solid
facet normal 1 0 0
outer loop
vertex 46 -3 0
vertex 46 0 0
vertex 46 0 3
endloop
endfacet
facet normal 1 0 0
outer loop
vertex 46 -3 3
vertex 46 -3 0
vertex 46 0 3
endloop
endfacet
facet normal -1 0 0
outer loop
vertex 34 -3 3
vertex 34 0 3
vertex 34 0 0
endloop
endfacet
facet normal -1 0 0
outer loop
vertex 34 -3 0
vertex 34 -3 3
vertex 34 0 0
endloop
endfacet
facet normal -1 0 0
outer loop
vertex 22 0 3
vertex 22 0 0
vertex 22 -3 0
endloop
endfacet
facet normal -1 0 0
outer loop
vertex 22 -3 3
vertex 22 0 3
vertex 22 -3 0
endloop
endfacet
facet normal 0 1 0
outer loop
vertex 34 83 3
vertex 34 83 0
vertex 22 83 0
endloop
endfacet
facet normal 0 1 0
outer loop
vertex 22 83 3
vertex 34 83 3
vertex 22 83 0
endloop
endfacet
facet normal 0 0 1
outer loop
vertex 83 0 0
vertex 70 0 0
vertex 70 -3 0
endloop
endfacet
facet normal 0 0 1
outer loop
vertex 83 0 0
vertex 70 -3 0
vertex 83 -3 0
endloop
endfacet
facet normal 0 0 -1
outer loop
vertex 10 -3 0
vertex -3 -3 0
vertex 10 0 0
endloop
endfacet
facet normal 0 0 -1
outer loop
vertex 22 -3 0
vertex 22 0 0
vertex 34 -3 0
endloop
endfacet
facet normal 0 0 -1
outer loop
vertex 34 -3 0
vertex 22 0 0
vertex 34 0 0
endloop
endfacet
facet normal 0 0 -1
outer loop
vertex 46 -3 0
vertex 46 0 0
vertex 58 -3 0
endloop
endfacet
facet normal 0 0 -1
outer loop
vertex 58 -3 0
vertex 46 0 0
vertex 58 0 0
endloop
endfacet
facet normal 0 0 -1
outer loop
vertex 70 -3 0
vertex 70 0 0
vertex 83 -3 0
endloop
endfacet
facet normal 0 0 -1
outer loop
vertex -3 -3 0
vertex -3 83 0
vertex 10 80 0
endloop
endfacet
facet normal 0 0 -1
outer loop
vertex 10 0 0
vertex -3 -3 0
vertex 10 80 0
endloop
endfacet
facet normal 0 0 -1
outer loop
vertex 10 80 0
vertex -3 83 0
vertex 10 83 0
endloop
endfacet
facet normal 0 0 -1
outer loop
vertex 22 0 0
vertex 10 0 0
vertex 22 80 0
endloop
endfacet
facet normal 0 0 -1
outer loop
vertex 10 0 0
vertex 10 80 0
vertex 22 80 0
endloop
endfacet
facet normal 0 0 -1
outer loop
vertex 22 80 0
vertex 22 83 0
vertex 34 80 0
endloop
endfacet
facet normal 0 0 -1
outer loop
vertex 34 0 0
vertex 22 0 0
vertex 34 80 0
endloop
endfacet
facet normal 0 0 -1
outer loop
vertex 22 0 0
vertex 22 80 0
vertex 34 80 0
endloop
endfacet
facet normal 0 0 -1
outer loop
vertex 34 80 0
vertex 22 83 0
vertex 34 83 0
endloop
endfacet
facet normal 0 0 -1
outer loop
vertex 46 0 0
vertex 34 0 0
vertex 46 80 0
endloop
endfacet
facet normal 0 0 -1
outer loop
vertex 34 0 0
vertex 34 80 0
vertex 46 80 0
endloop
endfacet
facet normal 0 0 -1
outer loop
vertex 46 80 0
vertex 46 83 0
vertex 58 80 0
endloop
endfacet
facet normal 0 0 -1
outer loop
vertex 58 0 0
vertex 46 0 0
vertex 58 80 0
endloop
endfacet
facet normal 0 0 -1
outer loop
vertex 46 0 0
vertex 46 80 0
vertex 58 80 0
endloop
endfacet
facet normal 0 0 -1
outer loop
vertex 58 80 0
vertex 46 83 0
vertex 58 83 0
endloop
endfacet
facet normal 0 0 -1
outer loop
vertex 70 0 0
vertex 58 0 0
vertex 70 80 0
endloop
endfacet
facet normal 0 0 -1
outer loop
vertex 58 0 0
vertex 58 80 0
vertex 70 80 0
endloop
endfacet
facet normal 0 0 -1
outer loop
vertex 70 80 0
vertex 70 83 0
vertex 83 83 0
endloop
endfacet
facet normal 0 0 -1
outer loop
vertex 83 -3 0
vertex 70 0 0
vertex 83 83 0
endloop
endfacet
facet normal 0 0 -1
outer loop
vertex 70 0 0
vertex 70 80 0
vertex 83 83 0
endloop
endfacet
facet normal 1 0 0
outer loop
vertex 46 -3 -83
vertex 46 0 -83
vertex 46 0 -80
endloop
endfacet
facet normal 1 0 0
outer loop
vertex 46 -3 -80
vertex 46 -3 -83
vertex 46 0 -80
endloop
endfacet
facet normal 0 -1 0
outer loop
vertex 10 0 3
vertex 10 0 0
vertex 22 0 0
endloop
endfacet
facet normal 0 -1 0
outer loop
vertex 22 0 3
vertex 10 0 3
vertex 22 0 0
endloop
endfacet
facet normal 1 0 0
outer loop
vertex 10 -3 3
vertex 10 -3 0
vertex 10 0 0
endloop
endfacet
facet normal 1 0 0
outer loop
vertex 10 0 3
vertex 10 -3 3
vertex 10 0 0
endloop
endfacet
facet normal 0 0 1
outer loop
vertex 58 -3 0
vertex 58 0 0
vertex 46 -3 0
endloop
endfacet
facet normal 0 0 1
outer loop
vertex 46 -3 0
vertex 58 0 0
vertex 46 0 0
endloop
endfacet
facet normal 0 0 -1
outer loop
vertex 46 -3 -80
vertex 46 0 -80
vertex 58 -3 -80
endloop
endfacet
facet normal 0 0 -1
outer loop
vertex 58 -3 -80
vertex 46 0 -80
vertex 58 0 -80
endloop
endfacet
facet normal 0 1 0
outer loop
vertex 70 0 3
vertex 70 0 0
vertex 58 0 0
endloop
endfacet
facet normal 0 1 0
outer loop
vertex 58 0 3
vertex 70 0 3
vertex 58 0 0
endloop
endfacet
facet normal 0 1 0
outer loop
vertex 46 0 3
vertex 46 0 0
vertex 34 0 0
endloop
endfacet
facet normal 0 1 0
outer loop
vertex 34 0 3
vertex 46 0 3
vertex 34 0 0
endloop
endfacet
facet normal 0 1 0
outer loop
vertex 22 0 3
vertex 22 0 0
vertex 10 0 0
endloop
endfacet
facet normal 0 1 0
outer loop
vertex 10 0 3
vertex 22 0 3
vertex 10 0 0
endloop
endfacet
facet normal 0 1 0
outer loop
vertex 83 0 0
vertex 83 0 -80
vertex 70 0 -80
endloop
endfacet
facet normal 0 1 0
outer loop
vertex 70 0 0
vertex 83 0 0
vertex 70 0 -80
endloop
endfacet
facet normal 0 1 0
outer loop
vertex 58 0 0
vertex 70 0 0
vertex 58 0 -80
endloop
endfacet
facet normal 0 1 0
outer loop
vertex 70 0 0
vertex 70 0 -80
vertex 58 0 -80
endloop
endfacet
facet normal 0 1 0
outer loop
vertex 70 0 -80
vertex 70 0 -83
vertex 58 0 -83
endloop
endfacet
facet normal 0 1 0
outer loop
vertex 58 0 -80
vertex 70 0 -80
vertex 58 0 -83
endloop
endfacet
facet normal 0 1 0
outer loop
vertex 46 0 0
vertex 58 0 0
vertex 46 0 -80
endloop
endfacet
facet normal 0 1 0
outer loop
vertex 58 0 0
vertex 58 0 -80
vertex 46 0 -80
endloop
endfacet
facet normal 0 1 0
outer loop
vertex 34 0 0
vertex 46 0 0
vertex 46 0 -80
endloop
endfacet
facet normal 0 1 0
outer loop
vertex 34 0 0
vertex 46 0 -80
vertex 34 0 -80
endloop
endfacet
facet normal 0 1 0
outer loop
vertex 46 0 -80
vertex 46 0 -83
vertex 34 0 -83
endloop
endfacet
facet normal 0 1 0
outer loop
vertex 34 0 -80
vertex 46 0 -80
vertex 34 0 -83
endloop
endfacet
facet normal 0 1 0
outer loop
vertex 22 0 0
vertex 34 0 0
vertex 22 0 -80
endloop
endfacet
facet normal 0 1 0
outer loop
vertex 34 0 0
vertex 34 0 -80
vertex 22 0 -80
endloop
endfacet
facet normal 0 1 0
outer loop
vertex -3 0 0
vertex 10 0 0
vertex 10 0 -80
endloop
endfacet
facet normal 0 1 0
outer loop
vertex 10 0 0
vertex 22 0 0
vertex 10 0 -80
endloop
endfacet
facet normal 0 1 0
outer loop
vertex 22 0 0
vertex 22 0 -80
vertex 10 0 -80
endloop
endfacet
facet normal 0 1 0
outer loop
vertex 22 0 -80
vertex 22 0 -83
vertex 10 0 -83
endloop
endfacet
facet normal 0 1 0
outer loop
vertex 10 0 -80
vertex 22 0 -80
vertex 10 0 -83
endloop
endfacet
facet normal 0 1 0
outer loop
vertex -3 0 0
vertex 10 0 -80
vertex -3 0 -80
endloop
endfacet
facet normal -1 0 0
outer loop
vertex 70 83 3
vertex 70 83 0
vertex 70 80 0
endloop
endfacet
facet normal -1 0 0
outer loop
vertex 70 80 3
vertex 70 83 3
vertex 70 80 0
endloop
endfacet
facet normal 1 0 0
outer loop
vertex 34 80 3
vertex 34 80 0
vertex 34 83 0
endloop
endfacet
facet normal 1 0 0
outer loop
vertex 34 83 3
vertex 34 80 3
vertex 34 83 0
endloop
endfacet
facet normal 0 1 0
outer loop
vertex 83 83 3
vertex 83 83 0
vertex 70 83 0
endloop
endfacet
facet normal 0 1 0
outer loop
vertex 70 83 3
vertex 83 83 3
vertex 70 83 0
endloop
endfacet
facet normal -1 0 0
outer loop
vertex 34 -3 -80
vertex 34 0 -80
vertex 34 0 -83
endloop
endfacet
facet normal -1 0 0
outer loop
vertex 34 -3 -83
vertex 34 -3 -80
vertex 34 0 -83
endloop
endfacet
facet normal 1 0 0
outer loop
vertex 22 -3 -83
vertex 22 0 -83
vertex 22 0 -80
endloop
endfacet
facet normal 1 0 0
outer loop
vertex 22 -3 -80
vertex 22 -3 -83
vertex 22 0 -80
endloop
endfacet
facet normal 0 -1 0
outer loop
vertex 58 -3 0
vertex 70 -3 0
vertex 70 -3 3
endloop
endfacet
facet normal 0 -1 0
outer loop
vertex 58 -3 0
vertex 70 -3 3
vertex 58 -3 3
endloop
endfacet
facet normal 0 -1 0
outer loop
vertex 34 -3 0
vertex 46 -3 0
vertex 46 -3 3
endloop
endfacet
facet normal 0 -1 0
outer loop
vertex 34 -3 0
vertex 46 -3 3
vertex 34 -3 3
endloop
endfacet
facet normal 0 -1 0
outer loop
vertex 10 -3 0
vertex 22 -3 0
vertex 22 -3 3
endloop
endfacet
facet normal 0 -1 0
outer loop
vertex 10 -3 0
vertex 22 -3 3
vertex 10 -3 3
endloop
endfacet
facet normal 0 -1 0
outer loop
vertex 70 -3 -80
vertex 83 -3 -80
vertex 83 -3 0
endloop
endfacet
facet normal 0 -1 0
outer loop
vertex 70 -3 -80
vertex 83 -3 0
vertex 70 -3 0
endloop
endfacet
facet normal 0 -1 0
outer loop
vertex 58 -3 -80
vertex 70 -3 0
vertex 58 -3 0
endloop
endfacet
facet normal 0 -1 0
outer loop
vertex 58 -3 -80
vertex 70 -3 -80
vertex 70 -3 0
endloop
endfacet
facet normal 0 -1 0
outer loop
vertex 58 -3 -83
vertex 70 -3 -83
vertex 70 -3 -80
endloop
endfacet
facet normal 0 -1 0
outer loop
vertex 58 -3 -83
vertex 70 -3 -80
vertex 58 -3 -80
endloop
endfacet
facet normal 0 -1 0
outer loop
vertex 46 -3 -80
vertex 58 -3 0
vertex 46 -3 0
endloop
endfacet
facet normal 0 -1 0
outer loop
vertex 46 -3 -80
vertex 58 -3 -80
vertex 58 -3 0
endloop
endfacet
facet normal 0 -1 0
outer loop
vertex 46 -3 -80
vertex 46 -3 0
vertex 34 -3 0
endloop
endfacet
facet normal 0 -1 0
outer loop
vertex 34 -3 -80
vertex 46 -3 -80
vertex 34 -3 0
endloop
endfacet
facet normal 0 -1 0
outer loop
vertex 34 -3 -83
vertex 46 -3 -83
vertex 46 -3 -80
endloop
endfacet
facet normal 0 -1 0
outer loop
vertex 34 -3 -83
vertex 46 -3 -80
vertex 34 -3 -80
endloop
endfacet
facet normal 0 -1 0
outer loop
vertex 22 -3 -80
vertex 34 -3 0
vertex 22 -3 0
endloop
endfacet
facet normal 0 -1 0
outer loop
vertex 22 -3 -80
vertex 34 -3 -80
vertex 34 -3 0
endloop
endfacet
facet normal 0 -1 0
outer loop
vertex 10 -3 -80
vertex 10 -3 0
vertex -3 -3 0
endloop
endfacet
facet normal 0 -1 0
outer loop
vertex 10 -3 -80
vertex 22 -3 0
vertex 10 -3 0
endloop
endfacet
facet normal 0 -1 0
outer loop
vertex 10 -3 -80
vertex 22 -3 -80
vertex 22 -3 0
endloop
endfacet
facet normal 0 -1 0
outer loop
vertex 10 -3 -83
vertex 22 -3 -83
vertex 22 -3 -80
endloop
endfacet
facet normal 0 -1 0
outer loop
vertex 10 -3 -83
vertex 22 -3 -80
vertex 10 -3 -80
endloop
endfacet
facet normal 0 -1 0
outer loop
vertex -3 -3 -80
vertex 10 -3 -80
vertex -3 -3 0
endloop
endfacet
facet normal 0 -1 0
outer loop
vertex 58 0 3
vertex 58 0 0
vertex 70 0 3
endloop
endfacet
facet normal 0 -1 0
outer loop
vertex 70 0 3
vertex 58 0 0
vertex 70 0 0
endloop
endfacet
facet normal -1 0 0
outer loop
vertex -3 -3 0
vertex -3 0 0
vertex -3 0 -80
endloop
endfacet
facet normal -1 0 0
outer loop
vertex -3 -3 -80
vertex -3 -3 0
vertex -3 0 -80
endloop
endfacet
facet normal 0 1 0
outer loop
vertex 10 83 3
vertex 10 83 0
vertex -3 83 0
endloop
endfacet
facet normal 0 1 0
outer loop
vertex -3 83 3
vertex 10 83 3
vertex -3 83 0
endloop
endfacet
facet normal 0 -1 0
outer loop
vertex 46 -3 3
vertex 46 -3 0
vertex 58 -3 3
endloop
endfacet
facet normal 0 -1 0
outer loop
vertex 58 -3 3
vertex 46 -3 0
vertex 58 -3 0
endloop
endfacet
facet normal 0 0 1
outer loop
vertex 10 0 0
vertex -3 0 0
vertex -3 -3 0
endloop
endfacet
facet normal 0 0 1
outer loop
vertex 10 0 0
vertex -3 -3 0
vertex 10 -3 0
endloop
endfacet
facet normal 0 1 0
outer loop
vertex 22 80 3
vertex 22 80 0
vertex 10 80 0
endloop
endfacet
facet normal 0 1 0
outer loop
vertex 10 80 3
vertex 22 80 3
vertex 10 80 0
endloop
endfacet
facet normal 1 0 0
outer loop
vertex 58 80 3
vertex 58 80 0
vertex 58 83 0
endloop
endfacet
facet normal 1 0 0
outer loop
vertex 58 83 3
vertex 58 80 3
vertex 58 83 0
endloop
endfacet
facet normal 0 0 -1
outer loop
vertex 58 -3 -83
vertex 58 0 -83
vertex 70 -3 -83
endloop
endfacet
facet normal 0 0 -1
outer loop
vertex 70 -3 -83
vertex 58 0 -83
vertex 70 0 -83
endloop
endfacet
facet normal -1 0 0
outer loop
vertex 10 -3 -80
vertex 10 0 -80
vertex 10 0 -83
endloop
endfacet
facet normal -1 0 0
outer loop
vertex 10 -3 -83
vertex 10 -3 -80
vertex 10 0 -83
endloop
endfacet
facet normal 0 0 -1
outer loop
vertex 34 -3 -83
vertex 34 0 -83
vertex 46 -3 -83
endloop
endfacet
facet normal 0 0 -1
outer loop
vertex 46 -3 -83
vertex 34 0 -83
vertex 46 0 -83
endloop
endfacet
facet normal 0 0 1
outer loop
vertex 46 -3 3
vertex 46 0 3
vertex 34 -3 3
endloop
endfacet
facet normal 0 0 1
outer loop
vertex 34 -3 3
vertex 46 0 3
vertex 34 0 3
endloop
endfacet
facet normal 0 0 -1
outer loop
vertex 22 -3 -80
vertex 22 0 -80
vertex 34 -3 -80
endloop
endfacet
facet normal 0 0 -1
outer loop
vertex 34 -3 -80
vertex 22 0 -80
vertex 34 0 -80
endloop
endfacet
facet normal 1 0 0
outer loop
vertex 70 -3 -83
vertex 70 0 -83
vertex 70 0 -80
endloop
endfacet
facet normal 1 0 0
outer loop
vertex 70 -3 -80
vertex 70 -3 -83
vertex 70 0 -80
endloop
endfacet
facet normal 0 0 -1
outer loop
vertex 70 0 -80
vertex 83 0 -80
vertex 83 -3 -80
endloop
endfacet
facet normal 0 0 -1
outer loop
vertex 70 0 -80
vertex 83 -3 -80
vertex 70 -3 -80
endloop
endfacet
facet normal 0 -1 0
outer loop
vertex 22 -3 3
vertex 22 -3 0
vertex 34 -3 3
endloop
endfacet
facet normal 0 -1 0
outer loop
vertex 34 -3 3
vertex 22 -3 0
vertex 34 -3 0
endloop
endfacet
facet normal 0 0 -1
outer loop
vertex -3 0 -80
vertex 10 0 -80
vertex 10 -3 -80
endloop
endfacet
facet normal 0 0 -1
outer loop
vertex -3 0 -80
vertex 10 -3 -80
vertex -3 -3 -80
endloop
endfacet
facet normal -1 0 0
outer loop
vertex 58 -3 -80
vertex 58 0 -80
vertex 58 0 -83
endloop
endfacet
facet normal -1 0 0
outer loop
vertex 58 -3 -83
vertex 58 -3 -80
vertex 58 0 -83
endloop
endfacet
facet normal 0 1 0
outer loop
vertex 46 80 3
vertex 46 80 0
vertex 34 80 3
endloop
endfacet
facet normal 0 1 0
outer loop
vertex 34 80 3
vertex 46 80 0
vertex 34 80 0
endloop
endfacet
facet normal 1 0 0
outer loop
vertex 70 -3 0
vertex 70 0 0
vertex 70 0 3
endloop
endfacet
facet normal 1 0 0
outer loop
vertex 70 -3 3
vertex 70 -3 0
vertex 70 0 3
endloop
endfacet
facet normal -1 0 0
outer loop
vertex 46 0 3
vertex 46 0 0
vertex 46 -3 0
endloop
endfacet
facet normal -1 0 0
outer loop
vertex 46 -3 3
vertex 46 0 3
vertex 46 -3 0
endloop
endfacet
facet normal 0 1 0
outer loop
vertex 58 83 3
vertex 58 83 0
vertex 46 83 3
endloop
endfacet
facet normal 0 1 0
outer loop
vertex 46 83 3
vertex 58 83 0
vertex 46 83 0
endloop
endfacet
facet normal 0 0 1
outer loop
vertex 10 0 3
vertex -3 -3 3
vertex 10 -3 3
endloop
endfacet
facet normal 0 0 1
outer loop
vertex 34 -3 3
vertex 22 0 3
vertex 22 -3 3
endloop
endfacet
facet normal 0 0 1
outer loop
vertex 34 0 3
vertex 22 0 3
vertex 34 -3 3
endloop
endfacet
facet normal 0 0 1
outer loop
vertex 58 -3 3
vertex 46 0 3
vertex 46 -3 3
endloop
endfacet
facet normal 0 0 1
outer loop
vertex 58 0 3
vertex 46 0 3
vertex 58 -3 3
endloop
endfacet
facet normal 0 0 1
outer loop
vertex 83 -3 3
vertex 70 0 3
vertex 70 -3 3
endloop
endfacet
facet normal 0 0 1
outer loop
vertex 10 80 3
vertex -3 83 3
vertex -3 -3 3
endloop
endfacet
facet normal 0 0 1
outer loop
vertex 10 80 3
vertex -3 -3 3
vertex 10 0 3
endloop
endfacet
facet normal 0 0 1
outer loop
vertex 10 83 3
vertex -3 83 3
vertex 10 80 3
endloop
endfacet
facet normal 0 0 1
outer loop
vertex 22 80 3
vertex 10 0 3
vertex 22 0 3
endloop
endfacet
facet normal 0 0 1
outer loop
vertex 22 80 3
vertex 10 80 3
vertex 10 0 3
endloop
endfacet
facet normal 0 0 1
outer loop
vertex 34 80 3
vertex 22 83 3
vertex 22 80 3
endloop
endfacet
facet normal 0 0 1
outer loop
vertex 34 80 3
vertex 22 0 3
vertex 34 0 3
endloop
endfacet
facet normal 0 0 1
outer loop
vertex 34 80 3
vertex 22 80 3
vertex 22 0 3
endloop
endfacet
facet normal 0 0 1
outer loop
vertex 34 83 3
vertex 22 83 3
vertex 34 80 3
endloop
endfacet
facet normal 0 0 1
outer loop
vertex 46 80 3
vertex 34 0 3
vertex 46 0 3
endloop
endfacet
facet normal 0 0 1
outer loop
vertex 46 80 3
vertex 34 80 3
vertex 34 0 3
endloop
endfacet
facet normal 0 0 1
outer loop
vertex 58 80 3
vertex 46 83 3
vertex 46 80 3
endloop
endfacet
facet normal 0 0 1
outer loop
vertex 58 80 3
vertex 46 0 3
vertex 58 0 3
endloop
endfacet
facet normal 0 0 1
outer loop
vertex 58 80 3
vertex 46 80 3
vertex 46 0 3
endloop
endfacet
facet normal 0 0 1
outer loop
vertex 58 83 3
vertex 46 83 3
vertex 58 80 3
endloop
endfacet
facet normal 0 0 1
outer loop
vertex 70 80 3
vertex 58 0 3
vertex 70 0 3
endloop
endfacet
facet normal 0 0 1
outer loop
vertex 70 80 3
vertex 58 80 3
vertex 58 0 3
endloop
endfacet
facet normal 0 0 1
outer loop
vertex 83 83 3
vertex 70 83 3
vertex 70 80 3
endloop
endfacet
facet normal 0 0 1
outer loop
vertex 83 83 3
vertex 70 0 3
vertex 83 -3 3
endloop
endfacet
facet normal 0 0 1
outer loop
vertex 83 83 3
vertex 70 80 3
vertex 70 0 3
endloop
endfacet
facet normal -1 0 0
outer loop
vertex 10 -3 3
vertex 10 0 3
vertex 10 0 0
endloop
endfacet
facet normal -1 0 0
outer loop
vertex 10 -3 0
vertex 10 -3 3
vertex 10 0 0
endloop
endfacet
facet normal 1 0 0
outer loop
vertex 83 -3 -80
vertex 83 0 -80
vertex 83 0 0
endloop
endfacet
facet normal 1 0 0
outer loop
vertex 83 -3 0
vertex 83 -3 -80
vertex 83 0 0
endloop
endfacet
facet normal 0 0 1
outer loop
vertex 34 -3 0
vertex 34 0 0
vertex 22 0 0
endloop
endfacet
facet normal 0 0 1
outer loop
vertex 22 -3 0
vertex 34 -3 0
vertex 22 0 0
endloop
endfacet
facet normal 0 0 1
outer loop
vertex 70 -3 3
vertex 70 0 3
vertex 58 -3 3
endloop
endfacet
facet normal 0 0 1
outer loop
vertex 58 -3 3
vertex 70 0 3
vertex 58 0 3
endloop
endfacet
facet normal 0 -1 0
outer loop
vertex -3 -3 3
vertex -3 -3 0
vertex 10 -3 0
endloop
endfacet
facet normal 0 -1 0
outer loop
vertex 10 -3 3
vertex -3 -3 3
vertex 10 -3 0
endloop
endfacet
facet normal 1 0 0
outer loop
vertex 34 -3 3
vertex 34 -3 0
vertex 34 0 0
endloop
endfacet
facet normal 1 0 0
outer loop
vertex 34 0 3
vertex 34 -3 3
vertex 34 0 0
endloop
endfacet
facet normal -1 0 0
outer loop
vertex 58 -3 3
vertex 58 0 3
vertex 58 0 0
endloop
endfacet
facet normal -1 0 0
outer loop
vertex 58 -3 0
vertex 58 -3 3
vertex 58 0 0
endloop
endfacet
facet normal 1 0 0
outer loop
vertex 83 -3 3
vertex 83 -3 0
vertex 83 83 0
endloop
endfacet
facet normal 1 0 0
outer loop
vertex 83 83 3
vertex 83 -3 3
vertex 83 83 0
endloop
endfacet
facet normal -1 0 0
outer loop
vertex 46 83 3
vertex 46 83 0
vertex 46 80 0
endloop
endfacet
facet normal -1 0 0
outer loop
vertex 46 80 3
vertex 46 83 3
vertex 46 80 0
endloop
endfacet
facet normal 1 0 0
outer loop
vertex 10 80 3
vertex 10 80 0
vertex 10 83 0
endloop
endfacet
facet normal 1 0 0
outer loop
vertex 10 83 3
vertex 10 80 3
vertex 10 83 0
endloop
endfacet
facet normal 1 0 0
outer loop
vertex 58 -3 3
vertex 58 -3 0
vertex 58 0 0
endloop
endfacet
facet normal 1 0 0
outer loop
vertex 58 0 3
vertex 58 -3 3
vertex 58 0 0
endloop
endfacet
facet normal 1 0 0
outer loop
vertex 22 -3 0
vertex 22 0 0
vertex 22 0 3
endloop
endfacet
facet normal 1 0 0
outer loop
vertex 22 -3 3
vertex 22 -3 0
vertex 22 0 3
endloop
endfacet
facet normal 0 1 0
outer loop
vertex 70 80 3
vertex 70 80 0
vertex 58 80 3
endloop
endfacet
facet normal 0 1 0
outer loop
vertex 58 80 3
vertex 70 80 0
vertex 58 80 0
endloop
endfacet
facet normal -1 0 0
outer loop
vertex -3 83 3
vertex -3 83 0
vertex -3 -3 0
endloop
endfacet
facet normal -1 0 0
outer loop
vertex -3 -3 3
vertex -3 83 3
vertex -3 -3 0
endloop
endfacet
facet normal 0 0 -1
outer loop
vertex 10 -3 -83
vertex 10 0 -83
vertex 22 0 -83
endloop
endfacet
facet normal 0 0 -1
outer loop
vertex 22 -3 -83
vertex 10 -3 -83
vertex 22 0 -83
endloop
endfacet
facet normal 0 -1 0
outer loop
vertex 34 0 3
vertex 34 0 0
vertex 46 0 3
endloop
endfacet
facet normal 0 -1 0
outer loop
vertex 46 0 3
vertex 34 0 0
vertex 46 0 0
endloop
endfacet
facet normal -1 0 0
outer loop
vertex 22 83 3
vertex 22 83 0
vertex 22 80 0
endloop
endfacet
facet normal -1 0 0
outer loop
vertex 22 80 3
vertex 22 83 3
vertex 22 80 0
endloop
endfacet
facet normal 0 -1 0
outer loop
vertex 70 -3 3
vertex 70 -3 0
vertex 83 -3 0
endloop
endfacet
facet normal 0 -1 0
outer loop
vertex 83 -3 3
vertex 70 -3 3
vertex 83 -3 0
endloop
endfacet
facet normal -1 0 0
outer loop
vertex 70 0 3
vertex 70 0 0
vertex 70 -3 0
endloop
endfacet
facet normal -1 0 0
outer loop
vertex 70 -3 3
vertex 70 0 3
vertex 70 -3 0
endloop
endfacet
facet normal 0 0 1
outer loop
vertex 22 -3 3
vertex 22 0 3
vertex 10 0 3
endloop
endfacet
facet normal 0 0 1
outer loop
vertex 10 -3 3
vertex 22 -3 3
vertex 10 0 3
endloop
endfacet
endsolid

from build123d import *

# Parameters (mm, degrees)
SALIENTE_EXTRUIR1_DEPTH = 3
SALIENTE_EXTRUIR4_DEPTH = 3


with BuildPart() as part:
    # Croquis1 → Saliente-Extruir1 (new body)
    with BuildSketch(Plane.XY):
        Polygon((10, 0), (22, 0), (22, -3), (34, -3), (34, 0), (46, 0), (46, -3), (58, -3), (58, 0), (70, 0), (70, -3), (83, -3), (83, 83), (70, 83), (70, 80), (58, 80), (58, 83), (46, 83), (46, 80), (34, 80), (34, 83), (22, 83), (22, 80), (10, 80), (10, 83), (-3, 83), (-3, -3), (10, -3), align=None)
    extrude(amount=SALIENTE_EXTRUIR1_DEPTH)


with BuildPart() as body_2:
    # Croquis4 → Saliente-Extruir4 (new body)
    with BuildSketch(Plane(origin=(0, 0, 0), x_dir=(1, 0, 0), z_dir=(0, 1, 0))):
        Polygon((-3, 0), (-3, 80), (0, 80), (10, 80), (10, 83), (22, 83), (22, 80), (34, 80), (34, 83), (46, 83), (46, 80), (58, 80), (58, 83), (70, 83), (70, 80), (80, 80), (83, 80), (83, 0), (80, 0), (70, 0), (70, -3), (58, -3), (58, 0), (46, 0), (46, -3), (34, -3), (34, 0), (22, 0), (22, -3), (10, -3), (10, 0), (0, 0), align=None)
    extrude(amount=-SALIENTE_EXTRUIR4_DEPTH)


solid = Compound([part.part, body_2.part])
